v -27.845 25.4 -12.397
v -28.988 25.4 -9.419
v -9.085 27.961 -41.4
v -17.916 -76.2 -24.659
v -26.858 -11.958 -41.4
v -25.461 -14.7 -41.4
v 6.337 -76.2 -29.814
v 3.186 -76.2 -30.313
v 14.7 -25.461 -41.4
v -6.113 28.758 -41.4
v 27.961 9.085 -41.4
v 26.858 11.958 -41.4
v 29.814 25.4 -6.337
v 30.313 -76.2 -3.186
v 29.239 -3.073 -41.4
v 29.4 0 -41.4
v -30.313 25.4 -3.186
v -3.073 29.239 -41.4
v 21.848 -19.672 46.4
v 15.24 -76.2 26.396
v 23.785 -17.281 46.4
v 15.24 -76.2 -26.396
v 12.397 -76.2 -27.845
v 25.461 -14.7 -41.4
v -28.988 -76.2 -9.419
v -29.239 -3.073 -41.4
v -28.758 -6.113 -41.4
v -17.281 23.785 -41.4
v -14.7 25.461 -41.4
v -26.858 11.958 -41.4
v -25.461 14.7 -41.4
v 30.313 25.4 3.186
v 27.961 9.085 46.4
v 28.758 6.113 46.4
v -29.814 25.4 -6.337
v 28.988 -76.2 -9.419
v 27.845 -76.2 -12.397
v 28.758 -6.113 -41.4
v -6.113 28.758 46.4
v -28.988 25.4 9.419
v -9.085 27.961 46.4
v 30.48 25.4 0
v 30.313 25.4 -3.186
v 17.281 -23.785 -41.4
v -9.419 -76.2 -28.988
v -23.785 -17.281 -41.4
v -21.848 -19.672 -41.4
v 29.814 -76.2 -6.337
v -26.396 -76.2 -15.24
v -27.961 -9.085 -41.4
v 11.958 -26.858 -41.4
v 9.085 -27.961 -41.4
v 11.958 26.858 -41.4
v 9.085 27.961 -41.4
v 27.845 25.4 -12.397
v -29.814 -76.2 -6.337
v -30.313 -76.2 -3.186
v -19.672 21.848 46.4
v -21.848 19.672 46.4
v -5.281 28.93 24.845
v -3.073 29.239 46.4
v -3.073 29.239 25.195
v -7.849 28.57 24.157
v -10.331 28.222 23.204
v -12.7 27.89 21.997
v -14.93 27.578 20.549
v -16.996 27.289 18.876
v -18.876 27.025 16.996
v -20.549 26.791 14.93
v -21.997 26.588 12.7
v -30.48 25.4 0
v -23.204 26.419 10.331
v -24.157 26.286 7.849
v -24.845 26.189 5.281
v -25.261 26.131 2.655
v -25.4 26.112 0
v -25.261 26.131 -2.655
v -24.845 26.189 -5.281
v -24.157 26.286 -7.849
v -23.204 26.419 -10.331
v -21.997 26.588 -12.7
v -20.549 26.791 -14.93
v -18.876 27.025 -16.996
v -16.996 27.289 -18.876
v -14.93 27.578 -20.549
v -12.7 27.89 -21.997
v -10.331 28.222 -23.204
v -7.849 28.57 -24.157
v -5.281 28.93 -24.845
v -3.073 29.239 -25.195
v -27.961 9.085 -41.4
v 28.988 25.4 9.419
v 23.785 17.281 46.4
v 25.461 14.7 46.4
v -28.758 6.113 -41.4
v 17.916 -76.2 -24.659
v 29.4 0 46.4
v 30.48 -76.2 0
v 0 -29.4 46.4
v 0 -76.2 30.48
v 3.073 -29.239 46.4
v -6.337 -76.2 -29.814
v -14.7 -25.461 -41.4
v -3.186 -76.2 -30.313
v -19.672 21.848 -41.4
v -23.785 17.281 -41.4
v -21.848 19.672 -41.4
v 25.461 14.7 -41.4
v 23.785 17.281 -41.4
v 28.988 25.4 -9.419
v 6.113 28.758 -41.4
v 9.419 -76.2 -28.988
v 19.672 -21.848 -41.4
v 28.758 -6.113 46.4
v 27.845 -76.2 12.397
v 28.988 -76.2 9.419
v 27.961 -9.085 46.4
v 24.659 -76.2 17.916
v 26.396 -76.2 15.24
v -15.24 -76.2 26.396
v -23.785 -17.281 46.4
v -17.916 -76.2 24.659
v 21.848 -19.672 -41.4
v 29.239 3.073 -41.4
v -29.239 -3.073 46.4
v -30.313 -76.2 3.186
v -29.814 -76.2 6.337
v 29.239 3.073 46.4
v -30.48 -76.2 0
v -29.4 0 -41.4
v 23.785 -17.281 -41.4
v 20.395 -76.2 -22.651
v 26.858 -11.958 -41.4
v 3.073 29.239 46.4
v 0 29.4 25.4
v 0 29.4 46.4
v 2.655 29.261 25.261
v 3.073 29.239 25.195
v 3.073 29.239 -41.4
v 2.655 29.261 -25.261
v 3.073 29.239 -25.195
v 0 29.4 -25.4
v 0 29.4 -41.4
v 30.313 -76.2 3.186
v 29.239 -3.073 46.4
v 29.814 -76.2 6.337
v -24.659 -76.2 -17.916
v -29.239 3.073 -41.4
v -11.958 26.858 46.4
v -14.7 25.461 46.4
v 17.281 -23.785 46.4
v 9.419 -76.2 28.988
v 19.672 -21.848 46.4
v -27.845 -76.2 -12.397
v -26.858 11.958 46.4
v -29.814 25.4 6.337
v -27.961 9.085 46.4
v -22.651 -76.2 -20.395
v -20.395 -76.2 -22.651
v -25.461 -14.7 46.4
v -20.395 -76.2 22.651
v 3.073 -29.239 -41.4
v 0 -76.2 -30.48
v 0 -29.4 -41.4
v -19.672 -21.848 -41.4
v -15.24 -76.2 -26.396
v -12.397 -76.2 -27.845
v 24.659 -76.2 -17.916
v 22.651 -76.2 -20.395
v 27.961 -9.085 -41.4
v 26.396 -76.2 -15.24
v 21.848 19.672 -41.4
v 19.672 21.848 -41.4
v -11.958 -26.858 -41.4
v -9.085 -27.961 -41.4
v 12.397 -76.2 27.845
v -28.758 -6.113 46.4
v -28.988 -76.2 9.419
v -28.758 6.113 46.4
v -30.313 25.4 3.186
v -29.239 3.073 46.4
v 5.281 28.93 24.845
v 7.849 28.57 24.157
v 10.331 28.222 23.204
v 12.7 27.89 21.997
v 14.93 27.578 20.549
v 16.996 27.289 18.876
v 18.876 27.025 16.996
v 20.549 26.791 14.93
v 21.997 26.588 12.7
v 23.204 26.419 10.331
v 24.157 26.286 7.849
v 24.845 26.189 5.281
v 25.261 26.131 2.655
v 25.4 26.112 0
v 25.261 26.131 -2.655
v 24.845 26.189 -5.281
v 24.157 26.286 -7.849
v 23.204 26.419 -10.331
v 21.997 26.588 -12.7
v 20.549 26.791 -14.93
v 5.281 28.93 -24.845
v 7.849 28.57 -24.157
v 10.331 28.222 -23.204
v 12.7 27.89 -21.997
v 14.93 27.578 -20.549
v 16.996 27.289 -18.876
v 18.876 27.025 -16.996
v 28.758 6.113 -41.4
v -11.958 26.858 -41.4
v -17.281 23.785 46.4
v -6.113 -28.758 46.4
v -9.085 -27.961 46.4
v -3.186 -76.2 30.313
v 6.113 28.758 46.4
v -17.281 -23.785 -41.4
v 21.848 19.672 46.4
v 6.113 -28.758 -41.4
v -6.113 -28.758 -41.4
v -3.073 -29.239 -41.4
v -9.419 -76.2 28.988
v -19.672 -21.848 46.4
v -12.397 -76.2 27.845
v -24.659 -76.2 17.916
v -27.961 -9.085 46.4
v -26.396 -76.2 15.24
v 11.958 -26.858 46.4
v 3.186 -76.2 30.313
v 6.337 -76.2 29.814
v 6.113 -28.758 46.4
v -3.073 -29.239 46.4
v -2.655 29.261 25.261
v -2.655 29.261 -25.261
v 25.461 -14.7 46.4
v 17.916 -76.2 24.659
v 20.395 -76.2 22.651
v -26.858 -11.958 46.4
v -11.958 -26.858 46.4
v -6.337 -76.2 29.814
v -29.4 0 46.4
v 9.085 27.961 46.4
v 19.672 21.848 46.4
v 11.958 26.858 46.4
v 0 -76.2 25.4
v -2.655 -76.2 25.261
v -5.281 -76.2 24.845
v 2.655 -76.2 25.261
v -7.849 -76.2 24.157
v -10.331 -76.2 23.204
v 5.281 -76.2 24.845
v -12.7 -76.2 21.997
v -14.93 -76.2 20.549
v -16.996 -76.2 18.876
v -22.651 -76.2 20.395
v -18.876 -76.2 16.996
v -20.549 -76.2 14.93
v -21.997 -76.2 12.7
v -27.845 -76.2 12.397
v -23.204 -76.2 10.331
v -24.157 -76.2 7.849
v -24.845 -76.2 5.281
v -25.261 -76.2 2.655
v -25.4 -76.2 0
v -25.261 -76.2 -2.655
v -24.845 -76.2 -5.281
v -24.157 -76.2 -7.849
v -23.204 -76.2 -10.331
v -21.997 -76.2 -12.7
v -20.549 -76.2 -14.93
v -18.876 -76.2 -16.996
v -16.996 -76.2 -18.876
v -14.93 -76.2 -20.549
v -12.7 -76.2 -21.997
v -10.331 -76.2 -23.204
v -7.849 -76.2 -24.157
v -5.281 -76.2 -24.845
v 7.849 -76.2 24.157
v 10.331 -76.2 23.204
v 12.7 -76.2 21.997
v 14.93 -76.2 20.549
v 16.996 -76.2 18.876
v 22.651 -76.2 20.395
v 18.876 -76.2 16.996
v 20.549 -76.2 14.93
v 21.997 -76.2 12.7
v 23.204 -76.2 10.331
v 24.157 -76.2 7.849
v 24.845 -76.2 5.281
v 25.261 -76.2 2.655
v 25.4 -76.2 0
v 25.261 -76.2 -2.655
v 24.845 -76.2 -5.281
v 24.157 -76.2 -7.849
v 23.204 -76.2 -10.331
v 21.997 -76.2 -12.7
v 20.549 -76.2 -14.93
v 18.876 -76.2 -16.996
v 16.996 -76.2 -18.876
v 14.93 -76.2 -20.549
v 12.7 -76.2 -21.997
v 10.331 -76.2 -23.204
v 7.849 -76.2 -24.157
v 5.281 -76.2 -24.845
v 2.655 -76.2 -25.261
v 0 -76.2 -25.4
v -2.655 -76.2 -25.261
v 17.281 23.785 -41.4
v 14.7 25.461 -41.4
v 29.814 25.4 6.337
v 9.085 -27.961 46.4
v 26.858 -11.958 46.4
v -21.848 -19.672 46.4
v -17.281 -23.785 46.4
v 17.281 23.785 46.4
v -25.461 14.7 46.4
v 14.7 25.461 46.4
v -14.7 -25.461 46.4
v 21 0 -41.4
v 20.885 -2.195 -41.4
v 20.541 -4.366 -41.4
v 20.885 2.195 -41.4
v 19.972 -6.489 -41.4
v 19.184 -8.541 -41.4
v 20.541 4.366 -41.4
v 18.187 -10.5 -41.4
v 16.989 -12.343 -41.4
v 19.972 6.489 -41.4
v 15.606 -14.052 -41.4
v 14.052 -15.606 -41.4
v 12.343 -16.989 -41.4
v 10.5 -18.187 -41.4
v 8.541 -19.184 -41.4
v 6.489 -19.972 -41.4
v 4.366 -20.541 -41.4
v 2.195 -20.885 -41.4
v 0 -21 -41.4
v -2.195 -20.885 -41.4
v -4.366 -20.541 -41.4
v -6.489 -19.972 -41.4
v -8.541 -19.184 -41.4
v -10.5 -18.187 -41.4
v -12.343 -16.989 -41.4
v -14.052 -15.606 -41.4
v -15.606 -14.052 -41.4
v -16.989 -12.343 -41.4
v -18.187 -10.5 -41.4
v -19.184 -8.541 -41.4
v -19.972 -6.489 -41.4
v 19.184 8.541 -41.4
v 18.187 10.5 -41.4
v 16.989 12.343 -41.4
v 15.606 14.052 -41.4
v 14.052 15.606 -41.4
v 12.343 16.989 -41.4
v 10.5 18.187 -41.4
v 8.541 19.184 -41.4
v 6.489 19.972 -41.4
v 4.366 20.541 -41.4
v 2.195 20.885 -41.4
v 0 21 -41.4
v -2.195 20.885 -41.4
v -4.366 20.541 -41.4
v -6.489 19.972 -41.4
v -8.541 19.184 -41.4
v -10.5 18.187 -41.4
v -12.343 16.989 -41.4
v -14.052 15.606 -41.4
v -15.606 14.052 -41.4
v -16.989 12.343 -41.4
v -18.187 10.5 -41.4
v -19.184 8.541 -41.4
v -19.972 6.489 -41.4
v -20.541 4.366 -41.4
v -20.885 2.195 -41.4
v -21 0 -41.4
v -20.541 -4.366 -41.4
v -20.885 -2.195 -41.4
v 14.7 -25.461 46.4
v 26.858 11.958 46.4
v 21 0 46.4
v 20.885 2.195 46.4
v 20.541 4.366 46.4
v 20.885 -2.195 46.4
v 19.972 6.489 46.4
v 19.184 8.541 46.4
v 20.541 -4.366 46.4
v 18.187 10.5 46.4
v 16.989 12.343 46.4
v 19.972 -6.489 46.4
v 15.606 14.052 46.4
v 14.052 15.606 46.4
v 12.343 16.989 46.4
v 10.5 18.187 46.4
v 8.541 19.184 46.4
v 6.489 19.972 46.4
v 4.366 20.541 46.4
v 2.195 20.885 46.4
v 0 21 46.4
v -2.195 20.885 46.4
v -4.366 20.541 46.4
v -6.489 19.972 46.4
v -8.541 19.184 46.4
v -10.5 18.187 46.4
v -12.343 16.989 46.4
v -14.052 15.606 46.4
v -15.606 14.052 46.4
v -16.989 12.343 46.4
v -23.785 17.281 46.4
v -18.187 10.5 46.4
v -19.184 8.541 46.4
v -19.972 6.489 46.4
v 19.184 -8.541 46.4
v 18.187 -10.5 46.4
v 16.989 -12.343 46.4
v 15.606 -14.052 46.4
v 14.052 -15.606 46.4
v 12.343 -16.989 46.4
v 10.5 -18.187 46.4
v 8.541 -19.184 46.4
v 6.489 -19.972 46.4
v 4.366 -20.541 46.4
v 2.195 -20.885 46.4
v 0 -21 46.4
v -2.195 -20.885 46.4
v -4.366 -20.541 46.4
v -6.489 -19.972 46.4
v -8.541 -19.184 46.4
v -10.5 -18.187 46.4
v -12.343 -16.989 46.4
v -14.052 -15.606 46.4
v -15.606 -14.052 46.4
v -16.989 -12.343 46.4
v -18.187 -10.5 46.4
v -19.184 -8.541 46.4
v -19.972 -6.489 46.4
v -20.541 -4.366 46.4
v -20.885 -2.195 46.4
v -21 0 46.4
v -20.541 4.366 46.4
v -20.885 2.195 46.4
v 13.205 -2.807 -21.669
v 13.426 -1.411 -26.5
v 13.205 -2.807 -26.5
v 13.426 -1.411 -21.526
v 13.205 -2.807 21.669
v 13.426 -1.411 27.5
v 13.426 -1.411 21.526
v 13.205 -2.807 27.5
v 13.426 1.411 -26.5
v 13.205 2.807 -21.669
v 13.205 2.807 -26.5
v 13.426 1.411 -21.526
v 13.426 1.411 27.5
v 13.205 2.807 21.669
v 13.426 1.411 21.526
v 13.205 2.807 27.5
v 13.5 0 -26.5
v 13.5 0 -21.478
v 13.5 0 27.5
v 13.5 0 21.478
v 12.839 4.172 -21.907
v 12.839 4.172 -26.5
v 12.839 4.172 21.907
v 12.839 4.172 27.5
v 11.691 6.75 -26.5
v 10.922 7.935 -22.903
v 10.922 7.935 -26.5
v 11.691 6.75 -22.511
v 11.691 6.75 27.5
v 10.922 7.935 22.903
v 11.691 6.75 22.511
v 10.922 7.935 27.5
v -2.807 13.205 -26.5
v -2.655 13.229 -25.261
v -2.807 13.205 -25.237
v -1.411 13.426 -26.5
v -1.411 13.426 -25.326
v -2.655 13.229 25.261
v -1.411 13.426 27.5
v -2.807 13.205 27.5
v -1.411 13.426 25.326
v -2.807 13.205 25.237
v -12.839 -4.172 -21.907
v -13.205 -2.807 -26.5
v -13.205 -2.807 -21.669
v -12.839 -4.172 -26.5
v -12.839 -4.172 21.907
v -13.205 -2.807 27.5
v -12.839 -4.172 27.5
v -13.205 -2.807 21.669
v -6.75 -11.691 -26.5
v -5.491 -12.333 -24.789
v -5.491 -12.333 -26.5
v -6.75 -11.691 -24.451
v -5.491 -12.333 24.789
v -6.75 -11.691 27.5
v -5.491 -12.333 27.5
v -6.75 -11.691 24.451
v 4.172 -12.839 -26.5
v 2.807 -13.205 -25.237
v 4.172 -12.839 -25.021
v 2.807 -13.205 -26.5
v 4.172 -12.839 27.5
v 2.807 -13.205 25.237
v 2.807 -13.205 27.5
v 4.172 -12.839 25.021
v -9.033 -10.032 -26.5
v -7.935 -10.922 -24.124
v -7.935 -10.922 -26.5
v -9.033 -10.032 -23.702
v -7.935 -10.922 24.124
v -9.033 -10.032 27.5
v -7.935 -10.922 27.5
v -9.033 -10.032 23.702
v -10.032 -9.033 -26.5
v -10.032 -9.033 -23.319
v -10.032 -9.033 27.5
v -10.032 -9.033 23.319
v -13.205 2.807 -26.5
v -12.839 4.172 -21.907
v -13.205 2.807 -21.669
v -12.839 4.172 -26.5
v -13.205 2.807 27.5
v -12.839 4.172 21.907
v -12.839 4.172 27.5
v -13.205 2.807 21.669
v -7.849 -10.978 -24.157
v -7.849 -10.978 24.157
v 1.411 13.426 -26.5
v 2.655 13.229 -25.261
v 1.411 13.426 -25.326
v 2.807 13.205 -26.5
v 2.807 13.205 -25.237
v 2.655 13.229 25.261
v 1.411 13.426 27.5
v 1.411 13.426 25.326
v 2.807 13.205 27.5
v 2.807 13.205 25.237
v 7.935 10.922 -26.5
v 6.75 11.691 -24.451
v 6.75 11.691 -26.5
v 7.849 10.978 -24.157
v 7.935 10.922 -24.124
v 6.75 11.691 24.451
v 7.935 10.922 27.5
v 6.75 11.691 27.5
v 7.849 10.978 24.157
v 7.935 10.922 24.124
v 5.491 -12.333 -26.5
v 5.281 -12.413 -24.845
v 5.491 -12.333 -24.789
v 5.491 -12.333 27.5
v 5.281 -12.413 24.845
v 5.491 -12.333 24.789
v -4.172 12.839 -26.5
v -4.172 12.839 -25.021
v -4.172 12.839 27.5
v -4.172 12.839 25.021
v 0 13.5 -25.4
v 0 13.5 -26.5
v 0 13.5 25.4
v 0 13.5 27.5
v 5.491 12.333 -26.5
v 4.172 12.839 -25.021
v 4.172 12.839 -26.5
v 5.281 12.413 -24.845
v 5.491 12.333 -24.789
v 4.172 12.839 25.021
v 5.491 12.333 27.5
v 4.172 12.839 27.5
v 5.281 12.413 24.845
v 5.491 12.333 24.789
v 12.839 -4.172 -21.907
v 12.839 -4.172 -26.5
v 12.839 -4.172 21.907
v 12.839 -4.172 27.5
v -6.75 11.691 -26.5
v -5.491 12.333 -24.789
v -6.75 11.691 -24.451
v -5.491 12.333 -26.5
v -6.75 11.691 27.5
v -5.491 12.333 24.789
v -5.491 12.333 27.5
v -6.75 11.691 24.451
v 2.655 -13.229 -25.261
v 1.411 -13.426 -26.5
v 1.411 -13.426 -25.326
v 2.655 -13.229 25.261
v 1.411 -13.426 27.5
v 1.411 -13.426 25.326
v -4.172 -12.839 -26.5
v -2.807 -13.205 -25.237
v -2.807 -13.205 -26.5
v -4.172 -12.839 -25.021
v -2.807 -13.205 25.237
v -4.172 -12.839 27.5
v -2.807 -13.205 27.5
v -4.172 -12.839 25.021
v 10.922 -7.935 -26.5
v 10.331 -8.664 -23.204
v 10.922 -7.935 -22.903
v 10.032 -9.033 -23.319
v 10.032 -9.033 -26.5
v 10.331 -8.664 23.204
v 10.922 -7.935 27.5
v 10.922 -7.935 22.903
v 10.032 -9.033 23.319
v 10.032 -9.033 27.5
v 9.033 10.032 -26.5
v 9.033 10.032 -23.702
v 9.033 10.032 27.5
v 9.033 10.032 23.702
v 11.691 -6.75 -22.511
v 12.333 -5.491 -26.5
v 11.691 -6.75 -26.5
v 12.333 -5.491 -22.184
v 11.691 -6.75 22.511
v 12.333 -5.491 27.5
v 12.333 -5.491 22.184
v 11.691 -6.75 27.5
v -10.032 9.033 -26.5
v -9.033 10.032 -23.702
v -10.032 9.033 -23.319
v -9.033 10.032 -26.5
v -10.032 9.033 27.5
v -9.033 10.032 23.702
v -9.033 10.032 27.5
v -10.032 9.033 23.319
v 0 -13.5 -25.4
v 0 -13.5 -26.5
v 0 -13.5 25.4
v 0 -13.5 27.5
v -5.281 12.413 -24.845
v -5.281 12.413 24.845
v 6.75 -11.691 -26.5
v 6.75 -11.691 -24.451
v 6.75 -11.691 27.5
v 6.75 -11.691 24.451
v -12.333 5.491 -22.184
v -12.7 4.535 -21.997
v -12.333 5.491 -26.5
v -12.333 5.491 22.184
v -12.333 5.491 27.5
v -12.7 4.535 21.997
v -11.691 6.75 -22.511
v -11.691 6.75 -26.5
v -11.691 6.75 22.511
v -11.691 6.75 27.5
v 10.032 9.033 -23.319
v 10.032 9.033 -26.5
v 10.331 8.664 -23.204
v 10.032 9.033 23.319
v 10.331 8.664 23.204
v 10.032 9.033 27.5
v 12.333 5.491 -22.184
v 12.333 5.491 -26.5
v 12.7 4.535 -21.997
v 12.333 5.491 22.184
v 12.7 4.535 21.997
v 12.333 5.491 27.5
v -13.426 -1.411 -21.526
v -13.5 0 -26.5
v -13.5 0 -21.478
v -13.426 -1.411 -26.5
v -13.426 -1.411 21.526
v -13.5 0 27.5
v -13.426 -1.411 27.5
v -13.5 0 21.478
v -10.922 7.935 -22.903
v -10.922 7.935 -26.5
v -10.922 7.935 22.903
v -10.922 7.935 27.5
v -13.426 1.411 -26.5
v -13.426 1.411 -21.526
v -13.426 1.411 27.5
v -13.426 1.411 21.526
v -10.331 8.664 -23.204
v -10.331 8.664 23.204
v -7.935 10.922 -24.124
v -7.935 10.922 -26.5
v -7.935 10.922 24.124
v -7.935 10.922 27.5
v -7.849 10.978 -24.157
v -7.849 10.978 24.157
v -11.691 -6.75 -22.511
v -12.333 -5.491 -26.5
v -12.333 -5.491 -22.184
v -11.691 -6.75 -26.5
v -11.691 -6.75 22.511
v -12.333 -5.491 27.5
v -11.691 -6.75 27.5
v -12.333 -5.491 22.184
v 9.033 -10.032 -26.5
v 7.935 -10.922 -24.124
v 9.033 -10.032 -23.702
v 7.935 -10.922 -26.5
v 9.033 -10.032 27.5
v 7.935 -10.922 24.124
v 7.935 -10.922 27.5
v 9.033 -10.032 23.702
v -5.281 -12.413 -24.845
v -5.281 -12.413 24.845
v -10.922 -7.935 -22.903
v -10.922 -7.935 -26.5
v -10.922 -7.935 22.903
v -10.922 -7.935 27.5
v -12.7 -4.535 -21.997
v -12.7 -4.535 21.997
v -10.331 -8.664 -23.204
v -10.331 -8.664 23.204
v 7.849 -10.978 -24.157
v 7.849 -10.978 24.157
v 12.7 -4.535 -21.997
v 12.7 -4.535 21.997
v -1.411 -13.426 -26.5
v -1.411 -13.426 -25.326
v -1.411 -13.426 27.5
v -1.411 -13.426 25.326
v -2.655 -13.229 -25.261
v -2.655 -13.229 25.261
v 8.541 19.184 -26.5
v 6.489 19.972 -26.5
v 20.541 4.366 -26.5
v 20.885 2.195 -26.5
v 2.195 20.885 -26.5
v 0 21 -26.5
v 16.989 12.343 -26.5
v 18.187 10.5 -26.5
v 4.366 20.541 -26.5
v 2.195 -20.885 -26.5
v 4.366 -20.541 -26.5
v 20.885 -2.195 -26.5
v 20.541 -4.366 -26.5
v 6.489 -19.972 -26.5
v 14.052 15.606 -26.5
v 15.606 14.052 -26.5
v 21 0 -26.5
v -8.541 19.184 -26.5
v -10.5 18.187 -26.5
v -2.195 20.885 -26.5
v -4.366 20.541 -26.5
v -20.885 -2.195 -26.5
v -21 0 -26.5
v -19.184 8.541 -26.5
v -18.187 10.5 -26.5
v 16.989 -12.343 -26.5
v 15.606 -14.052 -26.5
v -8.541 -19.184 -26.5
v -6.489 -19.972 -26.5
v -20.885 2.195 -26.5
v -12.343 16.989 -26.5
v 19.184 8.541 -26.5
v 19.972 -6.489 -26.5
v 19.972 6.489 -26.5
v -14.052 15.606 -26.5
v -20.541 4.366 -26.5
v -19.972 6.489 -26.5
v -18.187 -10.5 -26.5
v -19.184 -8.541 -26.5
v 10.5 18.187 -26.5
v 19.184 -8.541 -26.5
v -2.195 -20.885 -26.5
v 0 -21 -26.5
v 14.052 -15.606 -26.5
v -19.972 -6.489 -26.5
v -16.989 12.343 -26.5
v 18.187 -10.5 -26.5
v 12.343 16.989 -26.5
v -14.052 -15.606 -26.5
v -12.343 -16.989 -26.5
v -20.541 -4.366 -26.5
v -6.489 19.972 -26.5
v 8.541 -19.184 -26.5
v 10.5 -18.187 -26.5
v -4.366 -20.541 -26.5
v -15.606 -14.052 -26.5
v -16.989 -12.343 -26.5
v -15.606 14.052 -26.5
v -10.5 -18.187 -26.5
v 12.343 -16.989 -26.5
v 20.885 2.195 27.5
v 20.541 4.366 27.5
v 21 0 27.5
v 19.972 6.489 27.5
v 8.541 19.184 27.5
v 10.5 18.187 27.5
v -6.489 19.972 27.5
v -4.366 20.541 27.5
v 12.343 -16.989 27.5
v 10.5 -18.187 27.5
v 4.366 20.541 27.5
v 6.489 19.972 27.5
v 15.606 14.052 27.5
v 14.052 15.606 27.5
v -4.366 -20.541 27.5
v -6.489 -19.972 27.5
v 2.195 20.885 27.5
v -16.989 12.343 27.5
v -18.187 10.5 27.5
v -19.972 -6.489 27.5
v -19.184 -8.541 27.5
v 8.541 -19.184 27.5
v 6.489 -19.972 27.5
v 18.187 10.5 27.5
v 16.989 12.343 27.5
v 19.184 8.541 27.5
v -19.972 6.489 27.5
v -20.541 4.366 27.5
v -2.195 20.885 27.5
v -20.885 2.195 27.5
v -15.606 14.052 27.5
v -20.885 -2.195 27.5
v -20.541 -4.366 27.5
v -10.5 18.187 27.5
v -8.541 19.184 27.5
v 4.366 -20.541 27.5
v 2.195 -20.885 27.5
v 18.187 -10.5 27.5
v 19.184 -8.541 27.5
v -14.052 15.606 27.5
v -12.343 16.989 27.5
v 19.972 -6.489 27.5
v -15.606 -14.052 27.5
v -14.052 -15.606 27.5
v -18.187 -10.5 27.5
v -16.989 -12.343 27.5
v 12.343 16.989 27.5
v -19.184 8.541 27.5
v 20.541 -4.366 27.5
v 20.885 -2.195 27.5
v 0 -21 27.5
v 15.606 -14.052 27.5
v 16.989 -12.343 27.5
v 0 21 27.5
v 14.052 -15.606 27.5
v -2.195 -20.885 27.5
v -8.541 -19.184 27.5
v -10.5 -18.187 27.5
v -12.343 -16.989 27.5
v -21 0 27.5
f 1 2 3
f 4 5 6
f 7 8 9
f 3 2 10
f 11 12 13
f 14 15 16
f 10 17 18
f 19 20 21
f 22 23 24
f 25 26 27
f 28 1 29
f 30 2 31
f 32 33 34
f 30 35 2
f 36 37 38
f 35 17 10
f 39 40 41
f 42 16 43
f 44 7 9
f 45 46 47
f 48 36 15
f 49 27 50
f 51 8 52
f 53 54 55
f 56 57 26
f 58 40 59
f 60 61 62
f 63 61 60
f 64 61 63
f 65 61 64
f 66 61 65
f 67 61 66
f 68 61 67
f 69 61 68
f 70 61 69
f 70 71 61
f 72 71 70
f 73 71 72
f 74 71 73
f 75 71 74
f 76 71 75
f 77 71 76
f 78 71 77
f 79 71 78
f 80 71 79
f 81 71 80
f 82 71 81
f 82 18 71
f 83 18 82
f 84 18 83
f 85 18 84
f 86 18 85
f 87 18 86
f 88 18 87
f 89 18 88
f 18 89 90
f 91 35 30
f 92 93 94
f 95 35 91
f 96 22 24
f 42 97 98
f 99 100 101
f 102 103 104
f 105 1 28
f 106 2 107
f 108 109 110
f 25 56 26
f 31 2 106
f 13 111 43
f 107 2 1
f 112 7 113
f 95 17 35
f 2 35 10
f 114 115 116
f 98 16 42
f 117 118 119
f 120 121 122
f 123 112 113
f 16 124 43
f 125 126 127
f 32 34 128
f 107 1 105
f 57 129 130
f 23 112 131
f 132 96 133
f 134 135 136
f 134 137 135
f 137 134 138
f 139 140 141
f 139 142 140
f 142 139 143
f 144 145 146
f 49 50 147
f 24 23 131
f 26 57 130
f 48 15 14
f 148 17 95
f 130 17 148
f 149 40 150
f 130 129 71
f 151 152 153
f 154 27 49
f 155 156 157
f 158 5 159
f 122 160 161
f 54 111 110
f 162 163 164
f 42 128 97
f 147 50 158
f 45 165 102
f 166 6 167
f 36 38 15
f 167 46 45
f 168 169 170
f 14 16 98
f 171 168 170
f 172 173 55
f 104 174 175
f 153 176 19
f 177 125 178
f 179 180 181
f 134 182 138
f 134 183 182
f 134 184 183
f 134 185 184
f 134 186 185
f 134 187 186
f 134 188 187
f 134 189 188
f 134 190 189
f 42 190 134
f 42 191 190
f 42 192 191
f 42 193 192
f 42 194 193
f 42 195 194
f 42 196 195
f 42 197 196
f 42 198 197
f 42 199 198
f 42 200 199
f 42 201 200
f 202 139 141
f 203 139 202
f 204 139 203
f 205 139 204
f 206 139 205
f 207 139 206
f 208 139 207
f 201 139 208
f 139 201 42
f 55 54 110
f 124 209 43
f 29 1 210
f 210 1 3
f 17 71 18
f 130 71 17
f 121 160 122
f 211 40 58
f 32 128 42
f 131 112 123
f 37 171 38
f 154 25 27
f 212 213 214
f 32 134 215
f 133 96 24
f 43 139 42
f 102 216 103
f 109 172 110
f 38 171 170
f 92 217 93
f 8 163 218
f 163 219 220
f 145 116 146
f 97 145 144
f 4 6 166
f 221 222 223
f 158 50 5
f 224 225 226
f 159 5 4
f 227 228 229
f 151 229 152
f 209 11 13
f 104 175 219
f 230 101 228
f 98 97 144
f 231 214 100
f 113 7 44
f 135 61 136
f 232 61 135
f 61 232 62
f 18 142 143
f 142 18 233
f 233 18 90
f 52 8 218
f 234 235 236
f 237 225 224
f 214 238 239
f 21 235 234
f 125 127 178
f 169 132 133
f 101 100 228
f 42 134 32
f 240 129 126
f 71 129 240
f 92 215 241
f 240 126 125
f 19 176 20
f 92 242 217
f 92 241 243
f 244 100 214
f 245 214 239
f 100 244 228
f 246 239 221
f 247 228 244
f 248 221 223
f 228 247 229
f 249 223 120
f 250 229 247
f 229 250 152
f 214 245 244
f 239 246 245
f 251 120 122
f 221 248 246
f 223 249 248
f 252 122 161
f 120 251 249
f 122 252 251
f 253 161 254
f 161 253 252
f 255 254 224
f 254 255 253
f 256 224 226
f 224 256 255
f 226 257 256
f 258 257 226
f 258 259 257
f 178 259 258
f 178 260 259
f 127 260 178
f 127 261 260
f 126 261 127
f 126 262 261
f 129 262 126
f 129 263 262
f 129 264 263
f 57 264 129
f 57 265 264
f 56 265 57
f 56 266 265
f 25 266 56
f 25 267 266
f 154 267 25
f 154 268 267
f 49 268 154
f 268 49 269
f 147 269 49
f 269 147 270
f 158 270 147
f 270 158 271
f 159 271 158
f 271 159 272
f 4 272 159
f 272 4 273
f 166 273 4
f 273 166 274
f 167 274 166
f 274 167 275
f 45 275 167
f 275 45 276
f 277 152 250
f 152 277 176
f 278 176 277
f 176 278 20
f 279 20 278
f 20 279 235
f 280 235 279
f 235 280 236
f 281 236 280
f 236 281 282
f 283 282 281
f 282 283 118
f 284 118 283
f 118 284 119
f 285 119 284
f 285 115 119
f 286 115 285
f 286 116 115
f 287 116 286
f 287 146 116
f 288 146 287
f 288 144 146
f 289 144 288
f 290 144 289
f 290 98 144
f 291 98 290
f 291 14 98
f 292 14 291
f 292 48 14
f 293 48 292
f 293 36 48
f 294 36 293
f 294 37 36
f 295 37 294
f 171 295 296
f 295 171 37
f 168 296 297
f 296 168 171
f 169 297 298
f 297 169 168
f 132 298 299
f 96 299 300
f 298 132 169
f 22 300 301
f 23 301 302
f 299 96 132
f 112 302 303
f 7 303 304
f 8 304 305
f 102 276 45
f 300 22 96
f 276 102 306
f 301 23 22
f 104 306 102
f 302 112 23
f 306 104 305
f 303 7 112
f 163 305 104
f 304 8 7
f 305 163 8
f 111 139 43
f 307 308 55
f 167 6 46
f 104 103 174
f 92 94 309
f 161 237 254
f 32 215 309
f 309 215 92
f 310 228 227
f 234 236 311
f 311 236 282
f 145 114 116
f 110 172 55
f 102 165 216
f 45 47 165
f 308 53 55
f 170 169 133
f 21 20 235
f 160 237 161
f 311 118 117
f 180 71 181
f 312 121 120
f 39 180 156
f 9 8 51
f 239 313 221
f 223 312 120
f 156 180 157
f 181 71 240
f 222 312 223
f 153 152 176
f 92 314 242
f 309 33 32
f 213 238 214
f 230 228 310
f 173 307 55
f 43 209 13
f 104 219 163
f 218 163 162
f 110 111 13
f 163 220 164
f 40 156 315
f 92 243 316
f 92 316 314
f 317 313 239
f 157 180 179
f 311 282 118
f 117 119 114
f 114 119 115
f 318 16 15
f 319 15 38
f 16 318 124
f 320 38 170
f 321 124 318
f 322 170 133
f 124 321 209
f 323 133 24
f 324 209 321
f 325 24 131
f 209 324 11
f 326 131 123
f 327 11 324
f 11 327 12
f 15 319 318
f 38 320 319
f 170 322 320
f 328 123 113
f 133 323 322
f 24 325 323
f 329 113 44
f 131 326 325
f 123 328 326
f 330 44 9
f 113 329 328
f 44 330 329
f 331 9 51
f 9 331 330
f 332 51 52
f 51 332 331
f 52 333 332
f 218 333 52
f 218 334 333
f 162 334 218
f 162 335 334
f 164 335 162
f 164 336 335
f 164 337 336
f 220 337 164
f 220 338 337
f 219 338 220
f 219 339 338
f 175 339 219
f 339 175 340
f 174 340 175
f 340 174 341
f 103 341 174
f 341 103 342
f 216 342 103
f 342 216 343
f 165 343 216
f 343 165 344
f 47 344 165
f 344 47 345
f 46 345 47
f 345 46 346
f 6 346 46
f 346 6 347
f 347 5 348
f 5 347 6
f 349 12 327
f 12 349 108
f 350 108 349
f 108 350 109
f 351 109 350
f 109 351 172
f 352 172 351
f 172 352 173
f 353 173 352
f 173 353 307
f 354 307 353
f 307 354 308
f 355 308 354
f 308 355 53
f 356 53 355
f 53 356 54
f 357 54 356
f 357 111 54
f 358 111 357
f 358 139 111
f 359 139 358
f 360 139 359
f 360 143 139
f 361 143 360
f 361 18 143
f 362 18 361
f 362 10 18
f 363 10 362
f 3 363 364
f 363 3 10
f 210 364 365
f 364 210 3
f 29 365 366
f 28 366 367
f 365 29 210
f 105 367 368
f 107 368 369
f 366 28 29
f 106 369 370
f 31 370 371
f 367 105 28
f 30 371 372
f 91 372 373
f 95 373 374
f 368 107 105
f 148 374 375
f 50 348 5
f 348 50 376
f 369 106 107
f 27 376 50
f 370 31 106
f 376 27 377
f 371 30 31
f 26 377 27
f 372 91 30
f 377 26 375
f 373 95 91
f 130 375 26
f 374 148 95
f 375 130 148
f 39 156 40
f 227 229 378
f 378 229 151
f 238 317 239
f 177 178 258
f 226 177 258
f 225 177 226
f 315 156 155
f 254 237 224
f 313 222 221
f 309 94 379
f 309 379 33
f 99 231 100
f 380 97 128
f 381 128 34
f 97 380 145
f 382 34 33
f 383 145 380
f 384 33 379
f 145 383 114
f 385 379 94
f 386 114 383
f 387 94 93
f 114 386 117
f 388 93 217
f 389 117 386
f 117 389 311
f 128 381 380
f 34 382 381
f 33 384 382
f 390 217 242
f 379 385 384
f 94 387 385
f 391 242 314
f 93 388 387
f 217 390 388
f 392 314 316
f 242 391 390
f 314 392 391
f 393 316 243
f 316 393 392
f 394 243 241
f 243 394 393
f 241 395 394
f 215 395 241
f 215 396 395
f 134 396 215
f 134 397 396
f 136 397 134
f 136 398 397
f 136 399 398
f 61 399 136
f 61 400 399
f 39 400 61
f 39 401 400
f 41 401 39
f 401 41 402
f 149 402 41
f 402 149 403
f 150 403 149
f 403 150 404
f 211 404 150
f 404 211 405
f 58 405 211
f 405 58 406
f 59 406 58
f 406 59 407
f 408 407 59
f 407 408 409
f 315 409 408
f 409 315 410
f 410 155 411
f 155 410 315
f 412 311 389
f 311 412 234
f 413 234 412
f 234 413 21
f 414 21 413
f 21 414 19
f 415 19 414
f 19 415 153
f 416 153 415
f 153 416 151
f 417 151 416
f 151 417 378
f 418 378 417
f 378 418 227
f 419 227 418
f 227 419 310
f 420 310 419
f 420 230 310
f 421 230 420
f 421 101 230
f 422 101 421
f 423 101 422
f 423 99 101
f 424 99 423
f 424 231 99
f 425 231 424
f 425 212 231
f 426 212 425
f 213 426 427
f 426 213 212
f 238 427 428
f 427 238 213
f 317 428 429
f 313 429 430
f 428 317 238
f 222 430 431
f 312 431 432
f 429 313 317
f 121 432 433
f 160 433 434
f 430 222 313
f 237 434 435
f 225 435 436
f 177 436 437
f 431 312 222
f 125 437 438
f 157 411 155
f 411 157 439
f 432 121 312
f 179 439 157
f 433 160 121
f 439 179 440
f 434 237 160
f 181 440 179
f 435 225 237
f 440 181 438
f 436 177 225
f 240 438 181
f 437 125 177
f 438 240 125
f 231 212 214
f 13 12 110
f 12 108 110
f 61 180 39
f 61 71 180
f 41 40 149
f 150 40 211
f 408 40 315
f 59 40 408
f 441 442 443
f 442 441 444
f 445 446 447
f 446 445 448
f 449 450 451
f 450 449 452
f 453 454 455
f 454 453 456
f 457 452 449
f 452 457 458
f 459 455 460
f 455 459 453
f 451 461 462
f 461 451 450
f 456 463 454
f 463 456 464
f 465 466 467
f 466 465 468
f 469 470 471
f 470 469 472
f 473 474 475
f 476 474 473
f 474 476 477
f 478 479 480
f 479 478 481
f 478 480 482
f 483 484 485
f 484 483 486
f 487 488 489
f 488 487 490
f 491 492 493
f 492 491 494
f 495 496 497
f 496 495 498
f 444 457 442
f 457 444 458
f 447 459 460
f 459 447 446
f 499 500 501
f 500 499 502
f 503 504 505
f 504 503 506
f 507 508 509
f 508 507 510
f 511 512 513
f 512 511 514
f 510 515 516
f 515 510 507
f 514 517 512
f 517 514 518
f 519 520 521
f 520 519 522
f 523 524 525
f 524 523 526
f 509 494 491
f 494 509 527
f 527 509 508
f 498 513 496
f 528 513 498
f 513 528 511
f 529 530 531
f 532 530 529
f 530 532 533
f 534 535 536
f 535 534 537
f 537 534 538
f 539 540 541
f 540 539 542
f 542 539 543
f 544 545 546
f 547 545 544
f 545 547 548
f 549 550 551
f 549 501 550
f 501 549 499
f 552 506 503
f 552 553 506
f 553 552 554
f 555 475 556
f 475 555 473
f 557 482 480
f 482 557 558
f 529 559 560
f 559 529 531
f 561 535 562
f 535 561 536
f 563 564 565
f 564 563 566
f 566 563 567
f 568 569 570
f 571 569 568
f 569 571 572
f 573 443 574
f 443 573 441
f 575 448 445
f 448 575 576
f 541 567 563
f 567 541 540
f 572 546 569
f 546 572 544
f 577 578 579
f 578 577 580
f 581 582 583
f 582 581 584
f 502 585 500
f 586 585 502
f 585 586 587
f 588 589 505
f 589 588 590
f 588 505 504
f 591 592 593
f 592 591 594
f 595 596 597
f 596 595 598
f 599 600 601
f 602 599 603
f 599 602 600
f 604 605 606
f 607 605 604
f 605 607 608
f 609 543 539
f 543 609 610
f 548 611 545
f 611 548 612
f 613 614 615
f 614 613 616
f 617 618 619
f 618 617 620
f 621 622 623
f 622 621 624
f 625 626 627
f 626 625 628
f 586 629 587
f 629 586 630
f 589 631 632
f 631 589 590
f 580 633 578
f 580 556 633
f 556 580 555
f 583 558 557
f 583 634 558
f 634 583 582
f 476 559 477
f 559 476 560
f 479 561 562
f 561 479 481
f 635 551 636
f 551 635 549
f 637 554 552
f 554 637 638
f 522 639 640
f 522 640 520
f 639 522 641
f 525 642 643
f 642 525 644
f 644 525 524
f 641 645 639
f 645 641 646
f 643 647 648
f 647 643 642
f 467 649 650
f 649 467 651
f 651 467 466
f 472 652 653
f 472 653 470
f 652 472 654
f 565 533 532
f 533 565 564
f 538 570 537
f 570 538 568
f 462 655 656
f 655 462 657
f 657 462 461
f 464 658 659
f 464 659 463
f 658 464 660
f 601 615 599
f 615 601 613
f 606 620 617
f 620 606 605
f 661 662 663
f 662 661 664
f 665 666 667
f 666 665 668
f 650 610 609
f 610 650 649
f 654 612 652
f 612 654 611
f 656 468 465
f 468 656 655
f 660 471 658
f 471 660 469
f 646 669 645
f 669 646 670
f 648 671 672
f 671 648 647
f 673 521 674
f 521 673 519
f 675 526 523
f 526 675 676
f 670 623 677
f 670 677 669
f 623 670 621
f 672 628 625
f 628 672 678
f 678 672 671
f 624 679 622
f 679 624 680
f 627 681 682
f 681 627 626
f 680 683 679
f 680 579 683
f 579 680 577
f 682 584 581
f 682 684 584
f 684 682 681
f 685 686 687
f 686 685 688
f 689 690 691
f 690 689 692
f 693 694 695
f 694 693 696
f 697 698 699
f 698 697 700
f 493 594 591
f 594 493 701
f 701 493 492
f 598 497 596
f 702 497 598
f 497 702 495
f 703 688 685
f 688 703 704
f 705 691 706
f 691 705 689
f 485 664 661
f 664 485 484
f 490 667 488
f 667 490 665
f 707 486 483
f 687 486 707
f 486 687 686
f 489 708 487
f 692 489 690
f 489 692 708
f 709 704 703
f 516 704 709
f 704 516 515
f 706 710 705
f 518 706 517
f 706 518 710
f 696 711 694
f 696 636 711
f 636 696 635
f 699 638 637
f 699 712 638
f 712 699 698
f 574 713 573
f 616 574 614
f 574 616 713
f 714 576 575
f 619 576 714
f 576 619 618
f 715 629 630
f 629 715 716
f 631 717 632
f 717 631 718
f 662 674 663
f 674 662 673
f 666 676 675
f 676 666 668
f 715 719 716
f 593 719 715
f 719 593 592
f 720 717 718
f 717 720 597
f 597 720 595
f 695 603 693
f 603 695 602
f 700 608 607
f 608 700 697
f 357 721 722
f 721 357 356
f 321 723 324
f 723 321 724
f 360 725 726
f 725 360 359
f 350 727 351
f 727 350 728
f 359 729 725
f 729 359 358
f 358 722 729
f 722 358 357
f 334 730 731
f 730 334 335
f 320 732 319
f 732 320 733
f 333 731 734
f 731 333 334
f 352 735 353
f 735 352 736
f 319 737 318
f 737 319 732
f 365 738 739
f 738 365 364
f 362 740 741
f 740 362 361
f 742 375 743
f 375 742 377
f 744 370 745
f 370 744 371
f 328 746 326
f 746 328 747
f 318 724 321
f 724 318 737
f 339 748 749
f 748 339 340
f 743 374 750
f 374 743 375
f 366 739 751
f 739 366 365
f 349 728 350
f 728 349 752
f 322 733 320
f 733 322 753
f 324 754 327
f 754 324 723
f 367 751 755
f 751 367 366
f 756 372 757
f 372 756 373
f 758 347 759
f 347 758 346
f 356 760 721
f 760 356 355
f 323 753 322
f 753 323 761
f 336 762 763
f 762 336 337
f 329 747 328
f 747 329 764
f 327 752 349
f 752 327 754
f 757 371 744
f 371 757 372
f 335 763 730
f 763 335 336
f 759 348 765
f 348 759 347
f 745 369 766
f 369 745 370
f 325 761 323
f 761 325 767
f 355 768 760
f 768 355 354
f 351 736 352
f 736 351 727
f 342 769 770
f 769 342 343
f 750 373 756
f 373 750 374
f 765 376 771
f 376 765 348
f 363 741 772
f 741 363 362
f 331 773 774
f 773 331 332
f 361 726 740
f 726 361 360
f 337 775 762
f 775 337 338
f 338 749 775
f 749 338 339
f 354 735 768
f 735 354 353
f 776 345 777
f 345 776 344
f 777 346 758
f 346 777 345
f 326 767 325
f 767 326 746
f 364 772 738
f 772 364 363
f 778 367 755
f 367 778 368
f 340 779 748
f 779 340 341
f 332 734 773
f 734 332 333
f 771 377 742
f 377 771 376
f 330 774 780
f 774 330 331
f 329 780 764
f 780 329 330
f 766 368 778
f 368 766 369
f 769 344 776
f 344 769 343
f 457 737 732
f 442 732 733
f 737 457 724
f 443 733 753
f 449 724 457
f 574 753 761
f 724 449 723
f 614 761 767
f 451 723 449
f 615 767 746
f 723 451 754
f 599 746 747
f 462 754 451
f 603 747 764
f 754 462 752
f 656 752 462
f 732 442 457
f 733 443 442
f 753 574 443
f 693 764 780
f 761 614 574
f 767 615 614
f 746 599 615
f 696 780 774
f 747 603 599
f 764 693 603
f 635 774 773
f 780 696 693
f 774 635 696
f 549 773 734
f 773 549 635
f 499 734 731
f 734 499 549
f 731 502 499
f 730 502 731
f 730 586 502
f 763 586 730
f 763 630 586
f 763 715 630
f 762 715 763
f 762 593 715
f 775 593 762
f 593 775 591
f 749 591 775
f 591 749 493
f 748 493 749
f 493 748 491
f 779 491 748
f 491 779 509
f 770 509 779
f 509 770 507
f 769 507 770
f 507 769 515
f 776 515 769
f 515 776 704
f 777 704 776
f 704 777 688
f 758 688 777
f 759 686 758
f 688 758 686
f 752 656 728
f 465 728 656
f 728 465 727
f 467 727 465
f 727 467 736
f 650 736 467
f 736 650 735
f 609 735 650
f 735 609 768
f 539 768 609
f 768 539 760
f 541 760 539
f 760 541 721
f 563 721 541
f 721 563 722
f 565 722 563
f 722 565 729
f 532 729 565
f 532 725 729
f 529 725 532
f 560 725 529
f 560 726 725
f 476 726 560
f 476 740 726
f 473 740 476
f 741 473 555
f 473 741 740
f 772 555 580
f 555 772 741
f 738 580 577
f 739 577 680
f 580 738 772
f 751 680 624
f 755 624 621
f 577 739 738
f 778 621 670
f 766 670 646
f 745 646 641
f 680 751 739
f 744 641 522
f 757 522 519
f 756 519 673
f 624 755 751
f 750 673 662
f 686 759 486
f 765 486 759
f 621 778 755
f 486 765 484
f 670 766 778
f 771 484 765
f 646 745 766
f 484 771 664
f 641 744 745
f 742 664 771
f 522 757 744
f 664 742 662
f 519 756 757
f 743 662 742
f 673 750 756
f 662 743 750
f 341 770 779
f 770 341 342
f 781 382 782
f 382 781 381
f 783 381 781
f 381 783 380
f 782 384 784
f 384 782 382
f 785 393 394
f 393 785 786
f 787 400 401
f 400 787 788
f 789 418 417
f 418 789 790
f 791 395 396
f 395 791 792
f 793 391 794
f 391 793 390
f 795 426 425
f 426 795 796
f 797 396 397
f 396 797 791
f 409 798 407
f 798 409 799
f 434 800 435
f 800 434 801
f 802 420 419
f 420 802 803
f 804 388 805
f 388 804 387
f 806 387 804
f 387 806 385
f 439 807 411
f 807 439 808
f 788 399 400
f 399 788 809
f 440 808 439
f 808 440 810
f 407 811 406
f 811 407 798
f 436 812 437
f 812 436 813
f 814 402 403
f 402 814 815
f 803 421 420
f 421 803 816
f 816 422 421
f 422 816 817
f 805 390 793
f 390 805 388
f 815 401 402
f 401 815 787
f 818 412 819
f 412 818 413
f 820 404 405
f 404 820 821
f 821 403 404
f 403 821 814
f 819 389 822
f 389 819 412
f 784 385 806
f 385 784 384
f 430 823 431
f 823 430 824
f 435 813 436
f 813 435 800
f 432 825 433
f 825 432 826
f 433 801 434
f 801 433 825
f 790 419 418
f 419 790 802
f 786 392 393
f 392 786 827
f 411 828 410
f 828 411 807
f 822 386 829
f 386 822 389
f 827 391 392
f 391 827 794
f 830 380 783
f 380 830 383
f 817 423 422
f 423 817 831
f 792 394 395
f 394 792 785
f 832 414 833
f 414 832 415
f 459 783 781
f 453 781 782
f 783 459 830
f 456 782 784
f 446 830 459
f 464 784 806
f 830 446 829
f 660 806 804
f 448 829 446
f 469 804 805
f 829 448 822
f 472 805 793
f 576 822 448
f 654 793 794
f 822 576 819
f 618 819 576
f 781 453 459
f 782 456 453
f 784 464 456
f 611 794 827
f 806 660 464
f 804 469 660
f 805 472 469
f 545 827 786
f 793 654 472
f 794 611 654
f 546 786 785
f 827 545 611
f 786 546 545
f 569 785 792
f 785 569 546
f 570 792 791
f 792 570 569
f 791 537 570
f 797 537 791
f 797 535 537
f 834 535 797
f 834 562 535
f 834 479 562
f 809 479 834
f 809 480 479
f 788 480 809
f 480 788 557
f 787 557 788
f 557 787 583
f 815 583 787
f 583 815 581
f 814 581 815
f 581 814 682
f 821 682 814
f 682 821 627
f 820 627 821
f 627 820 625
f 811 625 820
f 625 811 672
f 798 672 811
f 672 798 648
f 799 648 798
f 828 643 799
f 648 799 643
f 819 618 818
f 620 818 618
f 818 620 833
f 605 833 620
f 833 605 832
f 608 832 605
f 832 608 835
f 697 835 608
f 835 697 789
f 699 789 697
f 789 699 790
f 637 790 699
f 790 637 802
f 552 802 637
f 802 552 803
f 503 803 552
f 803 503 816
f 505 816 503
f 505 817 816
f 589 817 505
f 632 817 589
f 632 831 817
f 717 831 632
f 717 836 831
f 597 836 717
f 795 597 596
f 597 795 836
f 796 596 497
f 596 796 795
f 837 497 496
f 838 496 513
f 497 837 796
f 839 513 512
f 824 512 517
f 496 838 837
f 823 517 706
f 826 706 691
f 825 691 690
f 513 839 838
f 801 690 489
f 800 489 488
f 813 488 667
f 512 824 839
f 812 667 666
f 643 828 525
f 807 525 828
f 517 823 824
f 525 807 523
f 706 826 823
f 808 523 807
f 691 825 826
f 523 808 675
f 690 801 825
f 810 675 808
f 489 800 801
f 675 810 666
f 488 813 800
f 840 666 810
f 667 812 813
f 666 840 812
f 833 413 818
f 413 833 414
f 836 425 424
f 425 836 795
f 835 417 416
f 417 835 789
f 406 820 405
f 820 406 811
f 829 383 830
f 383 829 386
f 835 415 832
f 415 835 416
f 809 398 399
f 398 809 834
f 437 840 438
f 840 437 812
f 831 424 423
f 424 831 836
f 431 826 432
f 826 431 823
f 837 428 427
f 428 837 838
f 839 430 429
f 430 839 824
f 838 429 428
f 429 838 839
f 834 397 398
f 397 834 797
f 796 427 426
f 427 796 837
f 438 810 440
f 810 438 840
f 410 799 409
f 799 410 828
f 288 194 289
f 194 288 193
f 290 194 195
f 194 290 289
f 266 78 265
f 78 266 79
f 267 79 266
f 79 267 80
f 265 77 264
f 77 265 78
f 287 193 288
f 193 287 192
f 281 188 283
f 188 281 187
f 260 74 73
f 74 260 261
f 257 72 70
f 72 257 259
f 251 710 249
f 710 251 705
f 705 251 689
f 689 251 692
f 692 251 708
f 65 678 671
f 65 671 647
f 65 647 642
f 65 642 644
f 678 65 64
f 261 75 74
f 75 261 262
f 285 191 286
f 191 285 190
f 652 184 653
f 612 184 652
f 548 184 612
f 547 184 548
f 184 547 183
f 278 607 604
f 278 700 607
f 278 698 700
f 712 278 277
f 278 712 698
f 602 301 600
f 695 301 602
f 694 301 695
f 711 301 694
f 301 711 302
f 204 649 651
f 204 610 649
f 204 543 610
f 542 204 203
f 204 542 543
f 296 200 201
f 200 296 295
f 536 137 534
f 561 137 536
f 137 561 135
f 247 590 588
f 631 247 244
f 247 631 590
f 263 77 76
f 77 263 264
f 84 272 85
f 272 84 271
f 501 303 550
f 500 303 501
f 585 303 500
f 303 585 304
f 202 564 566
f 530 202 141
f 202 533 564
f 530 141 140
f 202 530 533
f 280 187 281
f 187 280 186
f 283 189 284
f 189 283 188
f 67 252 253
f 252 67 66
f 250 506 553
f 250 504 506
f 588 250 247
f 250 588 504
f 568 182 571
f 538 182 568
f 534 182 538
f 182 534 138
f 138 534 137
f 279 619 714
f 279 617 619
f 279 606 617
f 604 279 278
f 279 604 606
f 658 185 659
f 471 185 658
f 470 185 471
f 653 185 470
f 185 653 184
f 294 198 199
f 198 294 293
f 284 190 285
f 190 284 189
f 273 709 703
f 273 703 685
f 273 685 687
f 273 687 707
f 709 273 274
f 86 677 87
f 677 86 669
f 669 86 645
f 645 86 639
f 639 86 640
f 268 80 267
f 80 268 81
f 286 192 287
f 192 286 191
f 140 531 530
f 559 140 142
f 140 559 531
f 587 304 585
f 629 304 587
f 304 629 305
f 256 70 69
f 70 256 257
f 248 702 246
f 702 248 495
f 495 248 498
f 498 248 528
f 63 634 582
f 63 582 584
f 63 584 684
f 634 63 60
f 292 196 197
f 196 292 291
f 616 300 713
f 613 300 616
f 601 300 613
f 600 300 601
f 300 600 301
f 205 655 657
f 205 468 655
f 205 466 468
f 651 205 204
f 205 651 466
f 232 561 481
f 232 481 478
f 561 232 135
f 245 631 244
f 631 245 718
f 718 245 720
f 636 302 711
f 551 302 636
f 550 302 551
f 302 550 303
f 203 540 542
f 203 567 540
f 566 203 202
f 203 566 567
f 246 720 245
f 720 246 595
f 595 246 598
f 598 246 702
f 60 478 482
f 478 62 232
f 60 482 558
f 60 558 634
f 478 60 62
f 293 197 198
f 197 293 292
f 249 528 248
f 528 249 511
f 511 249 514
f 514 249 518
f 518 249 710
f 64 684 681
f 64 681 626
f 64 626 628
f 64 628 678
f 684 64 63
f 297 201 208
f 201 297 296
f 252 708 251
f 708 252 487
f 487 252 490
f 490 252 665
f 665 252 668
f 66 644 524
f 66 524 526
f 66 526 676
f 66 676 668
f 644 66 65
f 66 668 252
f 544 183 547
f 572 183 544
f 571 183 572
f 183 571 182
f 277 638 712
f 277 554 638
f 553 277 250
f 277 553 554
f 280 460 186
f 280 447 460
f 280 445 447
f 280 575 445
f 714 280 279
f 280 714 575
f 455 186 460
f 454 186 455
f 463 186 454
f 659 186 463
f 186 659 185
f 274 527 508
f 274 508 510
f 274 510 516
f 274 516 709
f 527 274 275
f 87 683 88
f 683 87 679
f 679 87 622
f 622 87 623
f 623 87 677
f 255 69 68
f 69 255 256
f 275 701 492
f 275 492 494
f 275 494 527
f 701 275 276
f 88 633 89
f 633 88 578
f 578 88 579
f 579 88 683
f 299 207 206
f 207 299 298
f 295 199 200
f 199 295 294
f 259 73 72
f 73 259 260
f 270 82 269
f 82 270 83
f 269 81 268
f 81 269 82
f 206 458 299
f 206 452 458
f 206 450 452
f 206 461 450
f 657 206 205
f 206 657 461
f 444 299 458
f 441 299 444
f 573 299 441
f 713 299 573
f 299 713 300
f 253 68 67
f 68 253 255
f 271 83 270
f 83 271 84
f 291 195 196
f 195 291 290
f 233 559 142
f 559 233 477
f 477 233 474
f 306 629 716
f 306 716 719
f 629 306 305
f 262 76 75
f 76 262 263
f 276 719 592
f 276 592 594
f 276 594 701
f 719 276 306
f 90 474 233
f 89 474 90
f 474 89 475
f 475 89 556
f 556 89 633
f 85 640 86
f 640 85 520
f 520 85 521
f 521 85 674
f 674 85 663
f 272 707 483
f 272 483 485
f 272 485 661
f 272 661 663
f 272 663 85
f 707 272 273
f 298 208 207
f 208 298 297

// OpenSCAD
$fn=60;

bearing_od=42;
bearing_id=27;
bearing_h1 = 14;
bearing_h2 = 19;
space = 2;
shaft_d = 25.4*2;

difference() { 
    hull() {
        translate([0, 0, -shaft_d/2 - space - bearing_h1])
      cylinder(r=bearing_od*1.4/2, h = shaft_d + space*2 + bearing_h1 + bearing_h2);
        translate([0, shaft_d/2,0 ])
        rotate([90, 0, 0])
          cylinder(r=shaft_d*1.2/2, h=shaft_d*2);
    }
    cylinder(r=bearing_id/2, h=shaft_d*2+1, center=true);
    translate([0, 0, -shaft_d/2-space-bearing_h1-.1])
        cylinder(r=bearing_od/2, h=bearing_h1+1);
    translate([0, 0, shaft_d/2+space+.1])
     cylinder(r=bearing_od/2, h=bearing_h2+1);
        rotate([90, 0, 0])
    translate([0, 0, -shaft_d])
           cylinder(r=shaft_d/2, shaft_d*4+1);
}
